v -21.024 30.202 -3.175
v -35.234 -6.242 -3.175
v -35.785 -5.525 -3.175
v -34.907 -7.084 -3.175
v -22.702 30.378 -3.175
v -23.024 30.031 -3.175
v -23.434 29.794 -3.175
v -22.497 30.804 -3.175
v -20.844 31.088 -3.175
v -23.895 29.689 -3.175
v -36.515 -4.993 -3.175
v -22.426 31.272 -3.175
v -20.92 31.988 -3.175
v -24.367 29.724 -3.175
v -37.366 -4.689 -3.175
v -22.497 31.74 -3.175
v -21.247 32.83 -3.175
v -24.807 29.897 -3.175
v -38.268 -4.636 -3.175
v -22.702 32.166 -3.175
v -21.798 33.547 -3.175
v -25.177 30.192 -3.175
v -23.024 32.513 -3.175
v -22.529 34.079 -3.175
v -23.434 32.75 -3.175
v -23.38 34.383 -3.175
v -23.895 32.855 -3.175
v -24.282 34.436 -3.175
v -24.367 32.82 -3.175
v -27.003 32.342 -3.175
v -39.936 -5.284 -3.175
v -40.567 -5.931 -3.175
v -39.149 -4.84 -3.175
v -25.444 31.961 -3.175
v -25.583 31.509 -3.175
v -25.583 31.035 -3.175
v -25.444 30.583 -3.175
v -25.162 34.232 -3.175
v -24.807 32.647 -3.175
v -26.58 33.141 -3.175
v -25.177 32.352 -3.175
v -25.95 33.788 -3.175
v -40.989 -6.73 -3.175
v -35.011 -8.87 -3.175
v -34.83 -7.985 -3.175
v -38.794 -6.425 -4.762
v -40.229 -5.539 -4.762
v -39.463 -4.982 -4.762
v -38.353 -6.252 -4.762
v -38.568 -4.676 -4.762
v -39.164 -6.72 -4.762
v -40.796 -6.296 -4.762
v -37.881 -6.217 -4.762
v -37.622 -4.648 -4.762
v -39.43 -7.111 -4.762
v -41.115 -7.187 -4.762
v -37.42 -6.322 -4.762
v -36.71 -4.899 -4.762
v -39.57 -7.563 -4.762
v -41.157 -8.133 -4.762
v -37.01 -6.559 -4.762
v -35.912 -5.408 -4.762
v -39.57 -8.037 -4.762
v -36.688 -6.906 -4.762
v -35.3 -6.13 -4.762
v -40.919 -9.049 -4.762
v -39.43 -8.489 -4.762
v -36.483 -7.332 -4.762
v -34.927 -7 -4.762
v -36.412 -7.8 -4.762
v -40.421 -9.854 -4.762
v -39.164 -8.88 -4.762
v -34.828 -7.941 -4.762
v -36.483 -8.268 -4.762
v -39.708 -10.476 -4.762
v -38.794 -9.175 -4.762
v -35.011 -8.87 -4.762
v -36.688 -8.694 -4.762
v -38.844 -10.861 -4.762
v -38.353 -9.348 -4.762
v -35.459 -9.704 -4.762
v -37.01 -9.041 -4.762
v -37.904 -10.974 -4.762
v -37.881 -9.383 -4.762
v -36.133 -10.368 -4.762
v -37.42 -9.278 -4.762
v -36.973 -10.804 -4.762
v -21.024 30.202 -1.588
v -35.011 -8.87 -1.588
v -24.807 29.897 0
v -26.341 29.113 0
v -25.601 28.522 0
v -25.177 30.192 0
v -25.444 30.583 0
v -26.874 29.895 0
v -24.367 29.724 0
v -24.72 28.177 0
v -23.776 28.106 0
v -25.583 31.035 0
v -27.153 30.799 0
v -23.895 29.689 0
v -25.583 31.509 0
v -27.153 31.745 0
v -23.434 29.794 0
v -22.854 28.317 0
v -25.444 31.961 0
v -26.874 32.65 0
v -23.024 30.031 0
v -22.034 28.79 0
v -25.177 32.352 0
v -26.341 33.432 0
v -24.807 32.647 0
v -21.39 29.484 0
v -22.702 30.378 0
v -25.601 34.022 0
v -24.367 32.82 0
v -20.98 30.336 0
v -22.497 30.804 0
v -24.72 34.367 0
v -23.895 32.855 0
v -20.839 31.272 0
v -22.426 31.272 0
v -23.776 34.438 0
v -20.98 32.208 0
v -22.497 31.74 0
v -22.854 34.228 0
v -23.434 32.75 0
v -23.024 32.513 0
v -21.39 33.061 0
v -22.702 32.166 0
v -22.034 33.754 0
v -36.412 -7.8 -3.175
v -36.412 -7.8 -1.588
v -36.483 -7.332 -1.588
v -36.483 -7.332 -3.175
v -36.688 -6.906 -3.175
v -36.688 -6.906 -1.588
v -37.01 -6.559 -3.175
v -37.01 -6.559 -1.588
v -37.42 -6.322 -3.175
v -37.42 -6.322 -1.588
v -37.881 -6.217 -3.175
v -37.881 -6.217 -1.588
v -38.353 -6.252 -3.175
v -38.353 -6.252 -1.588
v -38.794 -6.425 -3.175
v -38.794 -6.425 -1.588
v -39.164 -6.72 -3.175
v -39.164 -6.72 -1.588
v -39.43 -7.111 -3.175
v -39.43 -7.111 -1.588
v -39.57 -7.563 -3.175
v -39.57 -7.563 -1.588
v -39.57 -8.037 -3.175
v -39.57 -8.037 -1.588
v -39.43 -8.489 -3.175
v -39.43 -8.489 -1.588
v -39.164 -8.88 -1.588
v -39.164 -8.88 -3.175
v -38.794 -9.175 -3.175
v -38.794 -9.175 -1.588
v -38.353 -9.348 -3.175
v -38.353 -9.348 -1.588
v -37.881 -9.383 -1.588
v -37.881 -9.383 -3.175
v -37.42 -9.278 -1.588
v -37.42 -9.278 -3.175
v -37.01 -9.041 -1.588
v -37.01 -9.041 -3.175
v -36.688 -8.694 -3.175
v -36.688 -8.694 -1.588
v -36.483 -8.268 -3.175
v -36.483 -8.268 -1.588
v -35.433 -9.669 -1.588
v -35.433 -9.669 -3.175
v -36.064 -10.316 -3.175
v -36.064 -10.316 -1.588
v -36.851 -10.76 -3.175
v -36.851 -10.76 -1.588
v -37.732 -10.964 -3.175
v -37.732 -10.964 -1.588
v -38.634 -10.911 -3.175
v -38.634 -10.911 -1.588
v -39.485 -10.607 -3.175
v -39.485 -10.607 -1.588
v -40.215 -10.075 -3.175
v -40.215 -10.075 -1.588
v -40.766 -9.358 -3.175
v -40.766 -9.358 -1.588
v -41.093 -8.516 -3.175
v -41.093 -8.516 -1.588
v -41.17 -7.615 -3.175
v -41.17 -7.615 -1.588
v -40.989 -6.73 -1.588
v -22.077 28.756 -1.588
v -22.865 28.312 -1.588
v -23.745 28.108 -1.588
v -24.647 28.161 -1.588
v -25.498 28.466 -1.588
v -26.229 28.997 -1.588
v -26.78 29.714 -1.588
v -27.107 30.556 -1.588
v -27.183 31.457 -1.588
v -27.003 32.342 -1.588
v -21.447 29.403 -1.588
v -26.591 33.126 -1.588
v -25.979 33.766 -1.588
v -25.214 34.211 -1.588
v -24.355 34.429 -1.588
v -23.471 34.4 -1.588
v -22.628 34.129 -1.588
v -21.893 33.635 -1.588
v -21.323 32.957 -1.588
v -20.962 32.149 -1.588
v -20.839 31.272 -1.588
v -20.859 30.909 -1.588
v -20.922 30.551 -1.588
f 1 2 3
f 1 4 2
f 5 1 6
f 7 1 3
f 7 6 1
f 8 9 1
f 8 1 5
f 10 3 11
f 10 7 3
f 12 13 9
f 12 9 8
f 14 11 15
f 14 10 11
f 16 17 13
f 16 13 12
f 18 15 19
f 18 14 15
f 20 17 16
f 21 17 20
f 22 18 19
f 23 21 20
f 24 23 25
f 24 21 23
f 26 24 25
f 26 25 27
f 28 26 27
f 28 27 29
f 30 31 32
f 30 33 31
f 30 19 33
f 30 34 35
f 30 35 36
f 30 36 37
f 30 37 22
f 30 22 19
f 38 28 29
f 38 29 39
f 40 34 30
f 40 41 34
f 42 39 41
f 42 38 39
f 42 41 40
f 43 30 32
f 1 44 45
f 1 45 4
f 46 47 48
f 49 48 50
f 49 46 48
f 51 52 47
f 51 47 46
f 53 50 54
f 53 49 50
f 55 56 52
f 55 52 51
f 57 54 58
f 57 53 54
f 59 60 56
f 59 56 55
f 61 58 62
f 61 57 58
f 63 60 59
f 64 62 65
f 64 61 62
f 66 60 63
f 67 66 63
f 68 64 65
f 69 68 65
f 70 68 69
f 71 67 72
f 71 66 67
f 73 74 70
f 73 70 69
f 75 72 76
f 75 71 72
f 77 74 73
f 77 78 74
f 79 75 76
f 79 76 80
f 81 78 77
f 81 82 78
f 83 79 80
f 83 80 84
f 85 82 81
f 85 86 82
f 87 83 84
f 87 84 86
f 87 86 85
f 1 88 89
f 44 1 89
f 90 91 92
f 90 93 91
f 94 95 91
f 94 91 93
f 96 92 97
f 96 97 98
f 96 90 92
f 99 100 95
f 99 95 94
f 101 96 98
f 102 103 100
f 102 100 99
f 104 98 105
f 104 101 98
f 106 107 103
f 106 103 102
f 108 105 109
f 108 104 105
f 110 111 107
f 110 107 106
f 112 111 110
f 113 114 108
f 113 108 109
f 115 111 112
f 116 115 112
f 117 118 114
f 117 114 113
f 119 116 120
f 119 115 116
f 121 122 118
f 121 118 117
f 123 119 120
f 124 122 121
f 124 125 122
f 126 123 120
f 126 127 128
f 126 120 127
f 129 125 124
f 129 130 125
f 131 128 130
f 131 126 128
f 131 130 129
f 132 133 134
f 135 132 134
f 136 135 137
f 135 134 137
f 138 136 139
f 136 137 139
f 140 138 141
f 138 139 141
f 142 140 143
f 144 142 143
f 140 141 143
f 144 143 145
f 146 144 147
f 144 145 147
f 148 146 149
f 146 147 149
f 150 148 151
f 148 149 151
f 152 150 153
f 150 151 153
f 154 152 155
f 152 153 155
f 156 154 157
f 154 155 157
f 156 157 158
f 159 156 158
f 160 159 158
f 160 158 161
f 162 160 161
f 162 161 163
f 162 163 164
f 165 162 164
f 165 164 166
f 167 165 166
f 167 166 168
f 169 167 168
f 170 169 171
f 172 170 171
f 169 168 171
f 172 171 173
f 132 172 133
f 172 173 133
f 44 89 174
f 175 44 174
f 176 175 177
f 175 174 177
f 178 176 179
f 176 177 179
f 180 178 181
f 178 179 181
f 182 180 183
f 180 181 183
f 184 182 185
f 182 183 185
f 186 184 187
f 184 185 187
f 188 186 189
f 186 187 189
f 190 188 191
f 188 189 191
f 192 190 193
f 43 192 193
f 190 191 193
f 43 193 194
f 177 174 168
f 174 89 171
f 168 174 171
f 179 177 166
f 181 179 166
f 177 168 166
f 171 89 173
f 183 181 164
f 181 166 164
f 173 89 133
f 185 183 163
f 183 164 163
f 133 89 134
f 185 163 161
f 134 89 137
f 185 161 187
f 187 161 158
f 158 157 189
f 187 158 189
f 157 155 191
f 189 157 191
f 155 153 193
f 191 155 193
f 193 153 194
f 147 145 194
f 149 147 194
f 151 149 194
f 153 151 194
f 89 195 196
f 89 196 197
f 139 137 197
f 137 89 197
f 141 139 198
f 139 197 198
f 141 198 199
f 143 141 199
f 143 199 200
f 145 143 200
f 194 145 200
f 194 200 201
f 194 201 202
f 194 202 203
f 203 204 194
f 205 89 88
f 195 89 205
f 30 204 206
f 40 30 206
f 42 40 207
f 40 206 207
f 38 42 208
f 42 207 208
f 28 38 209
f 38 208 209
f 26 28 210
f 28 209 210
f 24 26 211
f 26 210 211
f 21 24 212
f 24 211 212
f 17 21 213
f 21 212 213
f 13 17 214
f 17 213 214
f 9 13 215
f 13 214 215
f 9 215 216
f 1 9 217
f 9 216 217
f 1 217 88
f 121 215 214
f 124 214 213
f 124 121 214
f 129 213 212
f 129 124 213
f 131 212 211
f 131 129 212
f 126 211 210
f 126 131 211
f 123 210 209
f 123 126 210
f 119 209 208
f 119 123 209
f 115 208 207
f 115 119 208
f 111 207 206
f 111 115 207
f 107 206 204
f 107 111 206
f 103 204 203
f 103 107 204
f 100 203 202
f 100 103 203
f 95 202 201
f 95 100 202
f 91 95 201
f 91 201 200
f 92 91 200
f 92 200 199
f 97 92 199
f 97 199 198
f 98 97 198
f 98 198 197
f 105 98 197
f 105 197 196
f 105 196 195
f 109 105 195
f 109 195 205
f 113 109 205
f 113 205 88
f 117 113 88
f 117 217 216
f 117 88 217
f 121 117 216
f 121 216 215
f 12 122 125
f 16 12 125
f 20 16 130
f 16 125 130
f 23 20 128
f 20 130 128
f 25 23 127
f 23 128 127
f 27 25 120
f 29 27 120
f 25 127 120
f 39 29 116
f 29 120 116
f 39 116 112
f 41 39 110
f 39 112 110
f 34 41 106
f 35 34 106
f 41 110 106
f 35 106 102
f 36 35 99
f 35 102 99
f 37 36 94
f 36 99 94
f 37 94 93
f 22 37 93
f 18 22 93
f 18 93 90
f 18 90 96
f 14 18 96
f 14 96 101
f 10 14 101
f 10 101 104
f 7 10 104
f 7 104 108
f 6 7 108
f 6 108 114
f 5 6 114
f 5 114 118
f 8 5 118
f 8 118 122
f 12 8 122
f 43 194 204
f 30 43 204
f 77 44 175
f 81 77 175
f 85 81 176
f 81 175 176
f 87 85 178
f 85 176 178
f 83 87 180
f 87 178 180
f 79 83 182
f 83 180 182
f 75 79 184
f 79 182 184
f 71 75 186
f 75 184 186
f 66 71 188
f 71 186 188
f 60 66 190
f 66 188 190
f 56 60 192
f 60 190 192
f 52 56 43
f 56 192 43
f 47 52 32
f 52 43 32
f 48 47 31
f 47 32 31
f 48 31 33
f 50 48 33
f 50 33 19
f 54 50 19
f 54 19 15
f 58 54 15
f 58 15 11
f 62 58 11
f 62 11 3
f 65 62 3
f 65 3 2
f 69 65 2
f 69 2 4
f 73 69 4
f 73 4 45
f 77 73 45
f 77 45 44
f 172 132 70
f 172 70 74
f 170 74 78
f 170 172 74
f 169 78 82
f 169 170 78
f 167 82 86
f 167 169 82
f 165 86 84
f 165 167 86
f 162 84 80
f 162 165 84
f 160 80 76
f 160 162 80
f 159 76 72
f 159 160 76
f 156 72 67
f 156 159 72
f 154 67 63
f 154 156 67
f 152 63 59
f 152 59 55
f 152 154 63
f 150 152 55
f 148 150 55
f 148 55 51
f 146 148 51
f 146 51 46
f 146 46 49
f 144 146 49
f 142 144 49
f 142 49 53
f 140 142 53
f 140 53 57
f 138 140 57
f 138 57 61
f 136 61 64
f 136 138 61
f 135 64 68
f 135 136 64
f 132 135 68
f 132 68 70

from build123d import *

# Parameters (mm, degrees)
BOSS_EXTRUDE1_START = -1.5875
SKETCH1_R           = 1.5875
BOSS_EXTRUDE1_DEPTH = 1.5875
BOSS_EXTRUDE2_START = 1.5875
SKETCH3_R           = 3.175
SKETCH3_R_2         = 1.5875
BOSS_EXTRUDE2_DEPTH = 1.5875
SKETCH4_R           = 3.175
SKETCH4_R_2         = 1.5875
BOSS_EXTRUDE3_DEPTH = 1.5875


with BuildPart() as part:
    # Sketch1 → Boss-Extrude1 (new body)
    with BuildSketch(Plane.XY.offset(BOSS_EXTRUDE1_START)):
        with BuildLine():
            Line((-40.989250829, -6.729951179), (-27.002785927, 32.342146276))
            ThreePointArc((-27.002785927, 32.342146276), (-22.943486276, 34.261348284), (-21.024284268, 30.202048634))
            Line((-21.024284268, 30.202048634), (-35.010749171, -8.870048821))
            ThreePointArc((-35.010749171, -8.870048821), (-39.070048821, -10.789250829), (-40.989250829, -6.729951179))
        make_face()
        with Locations((-24.013535097, 31.272097455)):
            Circle(SKETCH1_R, mode=Mode.SUBTRACT)
        with Locations((-38, -7.8)):
            Circle(SKETCH1_R, mode=Mode.SUBTRACT)
    extrude(amount=-BOSS_EXTRUDE1_DEPTH)

    # Sketch3 → Boss-Extrude2 (add)
    with BuildSketch(Plane.XY.offset(-1.5875).offset(BOSS_EXTRUDE2_START)):
        with Locations((-24.013535097, 31.272097455)):
            Circle(SKETCH3_R)
        with Locations((-24.013535097, 31.272097455)):
            Circle(SKETCH3_R_2, mode=Mode.SUBTRACT)
    extrude(amount=-BOSS_EXTRUDE2_DEPTH)

    # Sketch4 → Boss-Extrude3 (add)
    with BuildSketch(Plane(origin=(0, 0, -3.175), x_dir=(-1, 0, 0), z_dir=(0, 0, -1))):
        with Locations(Location((38, -7.8, 0), (0, 0, 199.69561783))):
            Circle(SKETCH4_R)
        with Locations(Location((38, -7.8, 0), (0, 0, 180))):
            Circle(SKETCH4_R_2, mode=Mode.SUBTRACT)
    extrude(amount=BOSS_EXTRUDE3_DEPTH)


solid = part.part
